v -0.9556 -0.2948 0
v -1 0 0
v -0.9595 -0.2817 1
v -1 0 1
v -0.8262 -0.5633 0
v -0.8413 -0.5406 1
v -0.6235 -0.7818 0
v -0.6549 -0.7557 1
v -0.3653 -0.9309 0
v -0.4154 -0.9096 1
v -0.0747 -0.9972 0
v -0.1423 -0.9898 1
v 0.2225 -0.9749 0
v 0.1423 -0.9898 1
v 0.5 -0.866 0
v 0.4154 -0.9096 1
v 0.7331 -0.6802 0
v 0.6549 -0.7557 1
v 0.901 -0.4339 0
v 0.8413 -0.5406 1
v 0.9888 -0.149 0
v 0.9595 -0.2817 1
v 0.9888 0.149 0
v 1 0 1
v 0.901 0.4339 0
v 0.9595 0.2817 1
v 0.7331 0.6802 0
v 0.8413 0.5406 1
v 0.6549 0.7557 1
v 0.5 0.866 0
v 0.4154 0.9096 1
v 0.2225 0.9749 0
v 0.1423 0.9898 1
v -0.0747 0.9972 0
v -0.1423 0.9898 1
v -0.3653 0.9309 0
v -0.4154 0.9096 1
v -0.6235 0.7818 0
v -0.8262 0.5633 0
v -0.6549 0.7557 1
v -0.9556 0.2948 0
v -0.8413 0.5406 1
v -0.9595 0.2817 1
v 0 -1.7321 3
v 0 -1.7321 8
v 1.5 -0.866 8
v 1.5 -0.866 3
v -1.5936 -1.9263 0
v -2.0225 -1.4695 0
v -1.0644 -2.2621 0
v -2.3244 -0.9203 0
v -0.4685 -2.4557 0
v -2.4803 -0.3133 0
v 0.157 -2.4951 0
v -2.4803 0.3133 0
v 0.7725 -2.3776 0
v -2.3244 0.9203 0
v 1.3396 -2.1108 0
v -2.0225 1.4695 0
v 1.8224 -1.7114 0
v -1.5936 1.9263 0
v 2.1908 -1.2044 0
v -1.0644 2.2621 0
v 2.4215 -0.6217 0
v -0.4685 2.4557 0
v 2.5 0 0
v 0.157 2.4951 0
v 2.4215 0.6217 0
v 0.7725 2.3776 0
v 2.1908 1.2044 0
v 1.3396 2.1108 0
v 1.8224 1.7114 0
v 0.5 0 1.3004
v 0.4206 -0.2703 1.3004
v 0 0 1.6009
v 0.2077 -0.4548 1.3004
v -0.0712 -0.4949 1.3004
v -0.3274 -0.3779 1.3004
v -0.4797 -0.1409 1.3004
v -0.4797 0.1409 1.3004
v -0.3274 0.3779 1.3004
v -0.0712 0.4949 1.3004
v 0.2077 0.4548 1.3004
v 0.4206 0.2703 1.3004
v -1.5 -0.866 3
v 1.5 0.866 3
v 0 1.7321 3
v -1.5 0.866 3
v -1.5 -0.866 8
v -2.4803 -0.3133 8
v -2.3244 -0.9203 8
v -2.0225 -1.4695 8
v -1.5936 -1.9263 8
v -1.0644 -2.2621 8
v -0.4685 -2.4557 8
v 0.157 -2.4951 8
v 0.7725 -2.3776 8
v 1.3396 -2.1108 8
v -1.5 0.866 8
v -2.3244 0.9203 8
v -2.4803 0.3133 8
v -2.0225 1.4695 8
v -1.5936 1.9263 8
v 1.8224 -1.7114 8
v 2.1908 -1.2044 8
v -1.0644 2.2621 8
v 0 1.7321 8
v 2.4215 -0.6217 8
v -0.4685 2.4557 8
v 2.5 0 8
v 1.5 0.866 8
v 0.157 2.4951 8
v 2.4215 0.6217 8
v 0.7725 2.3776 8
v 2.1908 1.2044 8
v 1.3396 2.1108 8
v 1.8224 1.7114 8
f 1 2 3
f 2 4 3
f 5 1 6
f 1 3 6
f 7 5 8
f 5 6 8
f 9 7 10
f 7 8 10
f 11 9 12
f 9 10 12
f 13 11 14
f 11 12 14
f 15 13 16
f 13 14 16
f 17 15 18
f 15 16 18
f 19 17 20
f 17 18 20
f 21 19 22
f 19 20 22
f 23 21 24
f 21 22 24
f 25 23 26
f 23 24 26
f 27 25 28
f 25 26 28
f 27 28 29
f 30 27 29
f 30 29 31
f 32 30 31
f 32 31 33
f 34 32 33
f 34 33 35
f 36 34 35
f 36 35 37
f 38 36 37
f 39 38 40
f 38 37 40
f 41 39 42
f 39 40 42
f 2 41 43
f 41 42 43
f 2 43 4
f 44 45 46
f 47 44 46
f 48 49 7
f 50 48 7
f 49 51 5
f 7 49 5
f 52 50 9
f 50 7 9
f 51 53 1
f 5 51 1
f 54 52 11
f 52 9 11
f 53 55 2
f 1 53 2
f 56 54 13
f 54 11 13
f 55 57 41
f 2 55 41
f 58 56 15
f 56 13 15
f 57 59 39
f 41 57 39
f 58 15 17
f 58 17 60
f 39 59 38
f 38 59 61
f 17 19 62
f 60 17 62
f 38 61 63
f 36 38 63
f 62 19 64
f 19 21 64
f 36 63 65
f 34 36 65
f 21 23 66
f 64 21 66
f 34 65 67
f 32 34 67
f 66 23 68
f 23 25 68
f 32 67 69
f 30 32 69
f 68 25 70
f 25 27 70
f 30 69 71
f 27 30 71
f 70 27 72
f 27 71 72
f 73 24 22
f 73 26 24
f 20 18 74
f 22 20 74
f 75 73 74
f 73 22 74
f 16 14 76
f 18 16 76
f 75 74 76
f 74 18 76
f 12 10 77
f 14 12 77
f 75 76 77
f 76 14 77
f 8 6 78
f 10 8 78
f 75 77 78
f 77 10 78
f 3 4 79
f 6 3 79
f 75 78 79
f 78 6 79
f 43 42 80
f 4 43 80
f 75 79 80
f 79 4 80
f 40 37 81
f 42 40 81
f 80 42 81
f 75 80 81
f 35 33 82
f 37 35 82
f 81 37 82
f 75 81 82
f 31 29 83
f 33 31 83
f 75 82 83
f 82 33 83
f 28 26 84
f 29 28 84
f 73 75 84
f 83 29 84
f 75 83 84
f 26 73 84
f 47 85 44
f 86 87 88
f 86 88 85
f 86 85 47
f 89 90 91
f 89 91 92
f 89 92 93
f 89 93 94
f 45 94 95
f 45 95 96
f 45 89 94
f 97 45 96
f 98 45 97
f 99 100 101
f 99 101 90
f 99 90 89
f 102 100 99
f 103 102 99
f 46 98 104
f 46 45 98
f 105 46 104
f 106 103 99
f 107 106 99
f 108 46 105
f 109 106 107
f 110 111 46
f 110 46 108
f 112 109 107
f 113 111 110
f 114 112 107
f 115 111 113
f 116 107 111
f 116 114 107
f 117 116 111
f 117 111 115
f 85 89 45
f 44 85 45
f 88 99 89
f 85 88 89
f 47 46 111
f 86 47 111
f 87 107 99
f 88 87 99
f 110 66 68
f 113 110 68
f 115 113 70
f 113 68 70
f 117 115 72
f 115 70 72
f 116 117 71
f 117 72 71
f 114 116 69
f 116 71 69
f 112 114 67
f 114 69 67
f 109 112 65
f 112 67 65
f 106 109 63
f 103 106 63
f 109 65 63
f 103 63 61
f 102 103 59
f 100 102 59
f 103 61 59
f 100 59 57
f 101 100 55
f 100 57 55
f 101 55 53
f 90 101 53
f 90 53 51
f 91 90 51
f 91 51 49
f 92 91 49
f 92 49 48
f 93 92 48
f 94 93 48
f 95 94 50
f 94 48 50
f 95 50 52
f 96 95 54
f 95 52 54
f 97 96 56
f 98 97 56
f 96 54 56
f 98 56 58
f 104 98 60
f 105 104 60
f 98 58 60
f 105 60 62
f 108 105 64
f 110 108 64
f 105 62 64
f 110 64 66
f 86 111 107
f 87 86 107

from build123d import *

# Parameters (mm, degrees)
F0_R     = 2.5
F1_DEPTH = 8
F3_DEPTH = 5
F5_D     = 2
F5_DEPTH = 1
F5_TIP   = 0.600860619


with BuildPart() as f1:
    # F0 (on Top) → F1 (new body)
    with BuildSketch(Plane.XY):
        Circle(F0_R)
    extrude(amount=F1_DEPTH)

    # F2 (on face) → F3 (cut)
    with BuildSketch(Plane.XY.offset(8)):
        Polygon((1.5, -0.8660254038), (1.5, 0.8660254038), (0, 1.7320508076), (-1.5, 0.8660254038), (-1.5, -0.8660254038), (0, -1.7320508076), align=None)
    extrude(amount=-F3_DEPTH, mode=Mode.SUBTRACT)

    # F5
    with Locations(Plane(origin=(0, 0, 0), x_dir=(1, 0, 0), z_dir=(0, 0, -1))):
        with Locations((0, 0)):
            Hole(F5_D / 2, depth=F5_DEPTH)
            with Locations((0, 0, -(F5_DEPTH + F5_TIP / 2))):  # 118° drill point
                Cone(0, F5_D / 2, F5_TIP, mode=Mode.SUBTRACT)


solid = f1.part
